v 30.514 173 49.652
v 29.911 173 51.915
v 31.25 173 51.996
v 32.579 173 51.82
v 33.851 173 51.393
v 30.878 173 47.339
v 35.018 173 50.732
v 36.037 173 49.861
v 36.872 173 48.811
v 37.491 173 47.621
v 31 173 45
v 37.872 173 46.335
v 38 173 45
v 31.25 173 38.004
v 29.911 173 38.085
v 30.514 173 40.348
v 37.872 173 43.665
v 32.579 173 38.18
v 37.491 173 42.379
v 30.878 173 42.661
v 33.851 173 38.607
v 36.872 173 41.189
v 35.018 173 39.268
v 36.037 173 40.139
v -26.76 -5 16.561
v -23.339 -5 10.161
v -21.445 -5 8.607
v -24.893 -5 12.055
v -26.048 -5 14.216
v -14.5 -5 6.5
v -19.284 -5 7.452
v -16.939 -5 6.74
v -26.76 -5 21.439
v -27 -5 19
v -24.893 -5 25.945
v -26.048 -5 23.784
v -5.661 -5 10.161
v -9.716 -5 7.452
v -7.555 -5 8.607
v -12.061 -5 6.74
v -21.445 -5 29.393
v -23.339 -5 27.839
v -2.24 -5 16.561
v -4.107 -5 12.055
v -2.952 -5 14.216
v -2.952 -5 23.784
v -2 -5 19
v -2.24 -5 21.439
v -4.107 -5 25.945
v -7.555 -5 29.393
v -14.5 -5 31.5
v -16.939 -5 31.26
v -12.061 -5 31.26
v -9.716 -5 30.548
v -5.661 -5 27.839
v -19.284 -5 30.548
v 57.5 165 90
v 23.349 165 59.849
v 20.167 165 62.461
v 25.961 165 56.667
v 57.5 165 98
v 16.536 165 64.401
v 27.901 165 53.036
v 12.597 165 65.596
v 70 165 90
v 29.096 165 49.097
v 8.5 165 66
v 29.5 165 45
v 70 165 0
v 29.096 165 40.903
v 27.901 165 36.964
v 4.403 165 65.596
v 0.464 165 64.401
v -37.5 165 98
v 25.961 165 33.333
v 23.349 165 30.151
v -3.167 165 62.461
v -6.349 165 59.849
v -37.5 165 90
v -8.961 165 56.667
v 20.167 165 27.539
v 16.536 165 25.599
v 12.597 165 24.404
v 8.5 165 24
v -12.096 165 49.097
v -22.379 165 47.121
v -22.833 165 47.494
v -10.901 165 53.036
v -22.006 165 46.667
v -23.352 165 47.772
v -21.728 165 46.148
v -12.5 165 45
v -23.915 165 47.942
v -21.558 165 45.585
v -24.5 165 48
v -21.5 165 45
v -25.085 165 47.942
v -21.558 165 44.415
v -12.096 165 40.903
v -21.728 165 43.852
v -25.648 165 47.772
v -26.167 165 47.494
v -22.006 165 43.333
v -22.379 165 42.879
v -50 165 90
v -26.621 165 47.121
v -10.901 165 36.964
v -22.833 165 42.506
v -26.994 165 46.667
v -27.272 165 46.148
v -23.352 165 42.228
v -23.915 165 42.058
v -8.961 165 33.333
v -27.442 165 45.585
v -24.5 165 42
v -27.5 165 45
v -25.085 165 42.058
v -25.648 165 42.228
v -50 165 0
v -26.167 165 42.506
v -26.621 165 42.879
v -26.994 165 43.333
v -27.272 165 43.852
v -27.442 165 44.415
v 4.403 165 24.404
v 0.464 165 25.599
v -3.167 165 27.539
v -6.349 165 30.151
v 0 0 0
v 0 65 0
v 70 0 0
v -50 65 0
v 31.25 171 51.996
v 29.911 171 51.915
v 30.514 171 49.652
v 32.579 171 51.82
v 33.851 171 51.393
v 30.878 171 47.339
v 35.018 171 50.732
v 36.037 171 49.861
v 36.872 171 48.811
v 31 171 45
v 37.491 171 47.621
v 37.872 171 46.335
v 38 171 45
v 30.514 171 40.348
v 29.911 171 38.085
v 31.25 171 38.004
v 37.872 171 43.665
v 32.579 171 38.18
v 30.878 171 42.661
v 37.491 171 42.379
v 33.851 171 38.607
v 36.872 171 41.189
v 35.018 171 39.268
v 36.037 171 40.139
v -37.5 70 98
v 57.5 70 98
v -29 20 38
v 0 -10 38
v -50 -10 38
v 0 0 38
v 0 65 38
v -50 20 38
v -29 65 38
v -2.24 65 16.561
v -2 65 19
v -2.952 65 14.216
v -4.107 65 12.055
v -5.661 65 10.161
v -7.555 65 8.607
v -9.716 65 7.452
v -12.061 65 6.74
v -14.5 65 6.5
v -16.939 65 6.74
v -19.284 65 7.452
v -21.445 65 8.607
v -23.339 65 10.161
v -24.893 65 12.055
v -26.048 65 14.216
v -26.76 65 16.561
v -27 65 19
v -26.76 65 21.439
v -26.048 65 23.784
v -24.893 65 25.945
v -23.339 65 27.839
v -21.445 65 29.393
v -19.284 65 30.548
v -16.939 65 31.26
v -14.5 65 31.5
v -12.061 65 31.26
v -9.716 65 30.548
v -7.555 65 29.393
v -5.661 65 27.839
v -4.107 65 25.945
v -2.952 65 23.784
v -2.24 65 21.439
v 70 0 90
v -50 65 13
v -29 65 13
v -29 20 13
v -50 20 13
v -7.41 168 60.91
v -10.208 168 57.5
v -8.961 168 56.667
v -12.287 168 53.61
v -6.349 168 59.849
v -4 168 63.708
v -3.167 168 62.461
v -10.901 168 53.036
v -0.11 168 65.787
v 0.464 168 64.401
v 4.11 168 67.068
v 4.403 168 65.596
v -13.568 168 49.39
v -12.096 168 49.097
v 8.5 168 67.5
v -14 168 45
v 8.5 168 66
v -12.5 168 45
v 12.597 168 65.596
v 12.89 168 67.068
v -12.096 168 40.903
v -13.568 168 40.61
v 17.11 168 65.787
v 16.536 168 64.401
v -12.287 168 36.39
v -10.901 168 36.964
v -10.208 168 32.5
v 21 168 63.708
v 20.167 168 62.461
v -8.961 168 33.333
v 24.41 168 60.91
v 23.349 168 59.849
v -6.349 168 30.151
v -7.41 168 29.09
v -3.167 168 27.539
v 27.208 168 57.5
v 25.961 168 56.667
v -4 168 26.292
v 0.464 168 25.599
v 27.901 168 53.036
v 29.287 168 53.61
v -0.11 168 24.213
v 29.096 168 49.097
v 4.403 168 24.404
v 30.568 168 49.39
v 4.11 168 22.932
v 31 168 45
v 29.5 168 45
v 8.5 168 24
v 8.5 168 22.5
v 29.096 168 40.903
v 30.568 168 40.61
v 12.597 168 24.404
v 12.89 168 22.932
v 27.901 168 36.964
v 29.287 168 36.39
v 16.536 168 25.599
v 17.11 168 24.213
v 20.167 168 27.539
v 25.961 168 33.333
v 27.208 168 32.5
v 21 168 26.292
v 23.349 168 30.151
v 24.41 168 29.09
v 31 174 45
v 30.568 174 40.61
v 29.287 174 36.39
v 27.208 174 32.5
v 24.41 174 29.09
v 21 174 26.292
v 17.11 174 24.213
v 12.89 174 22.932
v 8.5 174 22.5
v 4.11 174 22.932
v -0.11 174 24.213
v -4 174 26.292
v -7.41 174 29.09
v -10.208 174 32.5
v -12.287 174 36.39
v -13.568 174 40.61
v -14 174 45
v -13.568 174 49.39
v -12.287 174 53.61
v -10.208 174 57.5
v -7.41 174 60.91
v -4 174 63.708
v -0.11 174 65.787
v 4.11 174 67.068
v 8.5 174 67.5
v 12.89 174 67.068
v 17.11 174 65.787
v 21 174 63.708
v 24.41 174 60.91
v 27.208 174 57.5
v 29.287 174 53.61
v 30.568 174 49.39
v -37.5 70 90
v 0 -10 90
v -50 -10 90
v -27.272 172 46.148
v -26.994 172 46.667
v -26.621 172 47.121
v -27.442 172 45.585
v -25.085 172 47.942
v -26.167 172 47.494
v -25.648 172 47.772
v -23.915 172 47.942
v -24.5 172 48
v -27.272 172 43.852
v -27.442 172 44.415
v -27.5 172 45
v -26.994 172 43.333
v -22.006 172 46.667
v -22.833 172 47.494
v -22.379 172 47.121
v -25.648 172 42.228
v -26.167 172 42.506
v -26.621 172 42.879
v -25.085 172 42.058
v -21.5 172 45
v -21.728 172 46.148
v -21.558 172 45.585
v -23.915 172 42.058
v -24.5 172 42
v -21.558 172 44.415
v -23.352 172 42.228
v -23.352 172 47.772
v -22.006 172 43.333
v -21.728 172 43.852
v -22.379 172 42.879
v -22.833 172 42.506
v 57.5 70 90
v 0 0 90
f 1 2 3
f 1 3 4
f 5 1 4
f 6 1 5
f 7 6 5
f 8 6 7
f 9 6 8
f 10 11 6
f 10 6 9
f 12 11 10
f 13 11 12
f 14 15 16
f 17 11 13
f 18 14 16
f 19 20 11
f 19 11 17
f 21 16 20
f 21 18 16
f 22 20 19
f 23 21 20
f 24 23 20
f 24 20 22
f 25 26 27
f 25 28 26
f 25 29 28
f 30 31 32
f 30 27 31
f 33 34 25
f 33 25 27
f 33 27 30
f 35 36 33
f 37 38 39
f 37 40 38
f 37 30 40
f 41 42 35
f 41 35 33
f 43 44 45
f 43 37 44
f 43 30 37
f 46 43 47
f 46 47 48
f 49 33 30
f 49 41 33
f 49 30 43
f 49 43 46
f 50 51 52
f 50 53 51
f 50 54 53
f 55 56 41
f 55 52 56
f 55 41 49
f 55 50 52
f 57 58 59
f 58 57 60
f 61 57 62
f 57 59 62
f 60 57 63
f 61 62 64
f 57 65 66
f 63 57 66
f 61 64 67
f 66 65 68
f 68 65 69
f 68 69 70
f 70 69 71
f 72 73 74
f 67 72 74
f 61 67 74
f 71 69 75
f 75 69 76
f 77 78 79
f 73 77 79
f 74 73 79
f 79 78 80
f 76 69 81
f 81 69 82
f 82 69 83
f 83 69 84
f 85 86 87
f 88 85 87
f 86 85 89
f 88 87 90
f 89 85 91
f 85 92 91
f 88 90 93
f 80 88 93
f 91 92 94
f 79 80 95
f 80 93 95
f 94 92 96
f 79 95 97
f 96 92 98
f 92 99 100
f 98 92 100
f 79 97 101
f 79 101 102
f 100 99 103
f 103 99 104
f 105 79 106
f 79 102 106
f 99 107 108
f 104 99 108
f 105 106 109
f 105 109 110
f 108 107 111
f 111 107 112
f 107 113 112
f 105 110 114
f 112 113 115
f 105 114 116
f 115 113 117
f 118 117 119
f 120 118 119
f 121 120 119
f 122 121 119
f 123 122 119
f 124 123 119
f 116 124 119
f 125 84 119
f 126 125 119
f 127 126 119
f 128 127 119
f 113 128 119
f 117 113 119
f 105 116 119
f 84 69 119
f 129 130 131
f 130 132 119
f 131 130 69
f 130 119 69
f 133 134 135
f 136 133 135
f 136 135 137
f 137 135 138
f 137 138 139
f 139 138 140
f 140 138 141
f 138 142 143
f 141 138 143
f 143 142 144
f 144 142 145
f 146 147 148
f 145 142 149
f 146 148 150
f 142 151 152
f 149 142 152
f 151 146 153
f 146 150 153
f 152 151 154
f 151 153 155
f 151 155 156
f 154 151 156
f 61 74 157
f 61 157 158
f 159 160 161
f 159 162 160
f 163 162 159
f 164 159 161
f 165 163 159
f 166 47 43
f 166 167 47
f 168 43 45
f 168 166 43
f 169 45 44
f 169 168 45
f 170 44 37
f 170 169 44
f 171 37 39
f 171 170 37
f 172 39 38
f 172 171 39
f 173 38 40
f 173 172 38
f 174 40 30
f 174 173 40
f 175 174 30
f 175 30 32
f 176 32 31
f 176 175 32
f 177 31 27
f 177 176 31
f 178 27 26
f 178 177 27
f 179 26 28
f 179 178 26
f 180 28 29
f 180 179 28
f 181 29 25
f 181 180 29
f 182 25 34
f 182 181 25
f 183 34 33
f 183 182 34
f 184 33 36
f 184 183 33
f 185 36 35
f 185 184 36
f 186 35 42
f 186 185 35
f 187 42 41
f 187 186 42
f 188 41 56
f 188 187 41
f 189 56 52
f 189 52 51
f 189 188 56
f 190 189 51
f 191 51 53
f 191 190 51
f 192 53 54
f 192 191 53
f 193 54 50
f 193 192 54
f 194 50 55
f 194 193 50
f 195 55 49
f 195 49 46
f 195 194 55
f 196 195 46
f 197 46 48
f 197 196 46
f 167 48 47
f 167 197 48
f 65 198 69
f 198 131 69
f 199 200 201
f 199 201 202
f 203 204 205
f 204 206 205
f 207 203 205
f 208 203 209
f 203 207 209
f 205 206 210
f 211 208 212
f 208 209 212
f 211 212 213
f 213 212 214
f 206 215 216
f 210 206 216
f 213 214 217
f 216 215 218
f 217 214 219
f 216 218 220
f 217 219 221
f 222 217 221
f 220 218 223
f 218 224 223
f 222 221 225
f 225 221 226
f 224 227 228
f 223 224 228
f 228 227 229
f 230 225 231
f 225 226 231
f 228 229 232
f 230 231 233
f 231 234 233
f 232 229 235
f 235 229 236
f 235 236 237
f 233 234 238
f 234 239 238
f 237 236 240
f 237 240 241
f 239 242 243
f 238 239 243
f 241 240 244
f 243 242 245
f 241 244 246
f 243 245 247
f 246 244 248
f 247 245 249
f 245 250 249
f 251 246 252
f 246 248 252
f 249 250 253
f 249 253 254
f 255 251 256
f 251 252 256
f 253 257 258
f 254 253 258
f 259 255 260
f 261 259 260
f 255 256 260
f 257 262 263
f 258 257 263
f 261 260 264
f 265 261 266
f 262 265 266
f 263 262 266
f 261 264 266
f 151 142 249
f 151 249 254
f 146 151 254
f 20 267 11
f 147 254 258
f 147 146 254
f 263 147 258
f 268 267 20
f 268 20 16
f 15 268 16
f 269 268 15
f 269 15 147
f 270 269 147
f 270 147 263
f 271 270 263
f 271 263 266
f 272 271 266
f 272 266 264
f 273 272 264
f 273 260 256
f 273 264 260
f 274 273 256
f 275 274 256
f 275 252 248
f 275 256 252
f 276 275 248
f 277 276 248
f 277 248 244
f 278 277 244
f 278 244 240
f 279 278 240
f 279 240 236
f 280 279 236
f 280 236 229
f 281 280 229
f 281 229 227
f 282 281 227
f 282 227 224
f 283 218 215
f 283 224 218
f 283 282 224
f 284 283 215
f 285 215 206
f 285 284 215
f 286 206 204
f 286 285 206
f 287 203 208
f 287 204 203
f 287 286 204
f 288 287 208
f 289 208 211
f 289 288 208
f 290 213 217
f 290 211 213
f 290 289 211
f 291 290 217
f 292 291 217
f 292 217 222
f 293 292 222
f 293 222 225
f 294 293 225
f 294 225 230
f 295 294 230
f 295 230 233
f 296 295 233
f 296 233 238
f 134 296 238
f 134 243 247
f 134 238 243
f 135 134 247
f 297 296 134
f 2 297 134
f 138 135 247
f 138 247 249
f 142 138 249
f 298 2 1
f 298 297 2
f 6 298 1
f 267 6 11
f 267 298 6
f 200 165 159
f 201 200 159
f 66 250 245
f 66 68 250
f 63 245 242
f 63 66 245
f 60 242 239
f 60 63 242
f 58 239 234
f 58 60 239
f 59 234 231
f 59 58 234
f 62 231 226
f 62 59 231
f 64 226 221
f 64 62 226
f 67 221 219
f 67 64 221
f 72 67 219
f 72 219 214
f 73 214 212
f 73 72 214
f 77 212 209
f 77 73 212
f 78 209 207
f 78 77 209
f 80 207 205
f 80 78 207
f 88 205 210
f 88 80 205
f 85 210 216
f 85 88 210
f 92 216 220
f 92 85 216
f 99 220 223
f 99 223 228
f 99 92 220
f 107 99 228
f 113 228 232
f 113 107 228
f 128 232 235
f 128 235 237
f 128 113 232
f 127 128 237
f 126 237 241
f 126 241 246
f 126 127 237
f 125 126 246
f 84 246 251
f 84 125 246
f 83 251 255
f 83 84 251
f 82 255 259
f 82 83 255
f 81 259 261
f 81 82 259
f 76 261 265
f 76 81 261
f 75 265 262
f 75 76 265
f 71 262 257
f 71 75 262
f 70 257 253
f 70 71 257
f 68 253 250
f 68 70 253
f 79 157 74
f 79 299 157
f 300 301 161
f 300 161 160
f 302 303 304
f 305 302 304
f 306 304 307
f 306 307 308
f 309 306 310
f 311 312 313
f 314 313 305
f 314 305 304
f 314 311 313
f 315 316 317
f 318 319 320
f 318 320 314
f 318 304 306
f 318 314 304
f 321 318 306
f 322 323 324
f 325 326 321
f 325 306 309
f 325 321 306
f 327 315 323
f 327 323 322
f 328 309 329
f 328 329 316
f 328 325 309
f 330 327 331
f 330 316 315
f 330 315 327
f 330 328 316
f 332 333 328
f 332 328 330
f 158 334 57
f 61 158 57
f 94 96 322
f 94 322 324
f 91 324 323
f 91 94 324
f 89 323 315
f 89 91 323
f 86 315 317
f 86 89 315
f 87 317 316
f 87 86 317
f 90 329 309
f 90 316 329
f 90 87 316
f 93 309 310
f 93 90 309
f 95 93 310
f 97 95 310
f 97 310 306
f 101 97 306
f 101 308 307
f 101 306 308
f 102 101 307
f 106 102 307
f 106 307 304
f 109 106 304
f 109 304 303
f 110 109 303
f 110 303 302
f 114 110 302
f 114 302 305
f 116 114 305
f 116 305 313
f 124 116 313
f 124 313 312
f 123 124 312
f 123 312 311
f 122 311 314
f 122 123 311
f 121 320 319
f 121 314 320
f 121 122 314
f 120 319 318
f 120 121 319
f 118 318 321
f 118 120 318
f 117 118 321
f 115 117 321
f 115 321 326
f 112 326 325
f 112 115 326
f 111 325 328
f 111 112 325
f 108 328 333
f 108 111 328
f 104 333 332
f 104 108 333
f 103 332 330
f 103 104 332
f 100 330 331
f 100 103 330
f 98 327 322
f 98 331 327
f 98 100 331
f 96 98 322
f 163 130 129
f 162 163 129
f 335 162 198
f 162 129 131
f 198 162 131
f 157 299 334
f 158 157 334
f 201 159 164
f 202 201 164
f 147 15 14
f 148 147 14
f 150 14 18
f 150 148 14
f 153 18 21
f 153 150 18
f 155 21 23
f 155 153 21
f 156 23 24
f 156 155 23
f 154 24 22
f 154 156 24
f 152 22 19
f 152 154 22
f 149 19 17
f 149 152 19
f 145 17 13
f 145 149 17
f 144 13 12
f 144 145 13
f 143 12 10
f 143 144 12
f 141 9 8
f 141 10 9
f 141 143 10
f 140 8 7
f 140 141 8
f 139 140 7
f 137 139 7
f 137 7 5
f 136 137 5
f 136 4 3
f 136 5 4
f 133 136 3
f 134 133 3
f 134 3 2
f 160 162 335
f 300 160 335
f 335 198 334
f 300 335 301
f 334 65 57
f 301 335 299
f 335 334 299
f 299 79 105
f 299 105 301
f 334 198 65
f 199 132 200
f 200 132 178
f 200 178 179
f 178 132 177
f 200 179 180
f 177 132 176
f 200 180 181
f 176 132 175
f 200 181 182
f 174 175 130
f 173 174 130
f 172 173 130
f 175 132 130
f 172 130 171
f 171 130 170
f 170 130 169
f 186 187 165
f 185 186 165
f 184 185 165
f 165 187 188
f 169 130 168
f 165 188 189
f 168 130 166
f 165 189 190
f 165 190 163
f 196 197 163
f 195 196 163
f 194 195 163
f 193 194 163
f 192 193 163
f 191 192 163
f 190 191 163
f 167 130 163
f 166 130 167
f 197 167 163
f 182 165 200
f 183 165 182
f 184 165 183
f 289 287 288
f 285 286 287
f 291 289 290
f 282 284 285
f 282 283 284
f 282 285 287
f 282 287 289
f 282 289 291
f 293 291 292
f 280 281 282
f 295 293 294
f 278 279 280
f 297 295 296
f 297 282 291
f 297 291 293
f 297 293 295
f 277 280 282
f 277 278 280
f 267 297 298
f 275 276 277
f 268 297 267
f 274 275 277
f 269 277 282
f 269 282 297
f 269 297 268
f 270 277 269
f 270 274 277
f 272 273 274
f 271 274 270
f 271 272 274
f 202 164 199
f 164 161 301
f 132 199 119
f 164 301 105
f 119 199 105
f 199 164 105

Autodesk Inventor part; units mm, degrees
sketch "Sketch2" plane through (0, 0, 0) normal (0, 0, 1) x (1, 0, 0)
  line L0 (0, 0) -> (70, 0)
  line L1 (70, 0) -> (70, 165)
  line L2 (70, 165) -> (0, 165)
  line L3 (0, 165) -> (0, 0)
  dimension "d0" = 165
  dimension "d1" = 70
extrude "Extrusion1" add sketch "Sketch2" along normal blind 90
sketch "Sketch6" plane through (0, 0, 0) normal (-1, 0, 0) x (0, 0, 1)
  line L0 (90, 0) -> (90, 165) projected
  line L1 (0, 0) -> (0, 165) projected
  line L2 (90, 165) -> (0, 165)
  line L3 (0, 165) -> (0, 65)
  line L4 (0, 65) -> (90, 65)
  line L5 (90, 65) -> (90, 165)
  dimension "d8" = 100
extrude "Extrusion3" add sketch "Sketch6" along normal blind 50
sketch "Sketch7" plane through (0, 65, 0) normal (0, -1, 0) x (1, 0, 0)
  line L0 (70, 90) -> (-50, 90) projected
  line L1 (0, 0) -> (0, 90) projected
  line L2 (-50, 90) -> (0, 90)
  line L3 (0, 90) -> (0, 38)
  line L4 (0, 38) -> (-50, 38)
  line L5 (-50, 38) -> (-50, 90)
  dimension "d11" = 52
extrude "Extrusion4" add sketch "Sketch7" along normal blind 75
sketch "Sketch8" plane through (0, 65, 38) normal (0, 0, -1) x (-1, 0, 0)
  line L0 (0, 0) -> (50, 0) projected
  line L1 (50, 0) -> (29, 0)
  line L2 (29, 0) -> (29, -45)
  line L3 (29, -45) -> (50, -45)
  line L4 (50, -45) -> (50, 0)
  point P0 (0, -65)
  point P1 (29, 0)
  dimension "d14" = 21
  dimension "d15" = 45
extrude "Extrusion5" add sketch "Sketch8" along normal blind 25
sketch "Sketch9" plane through (0, 0, 90) normal (0, 0, 1) x (1, 0, 0)
  line L0 (70, 165) -> (-50, 165) projected
  line L1 (-50, 165) -> (70, 165)
  line L2 (70, 165) -> (10, 165)
  line L3 (10, 70) -> (57.5, 70)
  line L4 (57.5, 70) -> (-37.5, 70)
  line L5 (-37.5, 70) -> (-37.5, 165)
  line L6 (57.5, 70) -> (57.5, 165)
  point P0 (0, 0)
  dimension "d20" = 95
  dimension "d21" = 95
extrude "Extrusion6" add sketch "Sketch9" along normal blind 8
ref_plane "Work Plane1" through (-48, 65, 2) normal (0, -1, 0) x (1, 0, 0)
sketch "Sketch10" plane through (-48, 65, 2) normal (0, -1, 0) x (1, 0, 0)
  line L0 (21, 34) -> (46, 34) projected
  line L1 (33.5, 34) -> (33.5, 0)
  line L2 (46, 0) -> (0, 0) projected
  circle A0 centre (33.5, 17) radius 12.5
  point P0 (48, -2)
extrude "Extrusion7" add sketch "Sketch10" along normal blind 70
ref_plane "Work Plane3" through (-48, 165, 5) normal (0, 1, 0) x (1, 0, 0)
sketch "Sketch11" plane through (-48, 165, 5) normal (0, 1, 0) x (1, 0, 0)
  line L0 (113, 0) -> (113, -80) projected
  line L1 (0, -80) -> (0, 0) projected
  circle A0 centre (56.5, -40) radius 21
  point P0 (48, 5)
  dimension "d29" = 42
extrude "Extrusion8" add sketch "Sketch11" along normal blind 6
ref_plane "Work Plane2" through (-48, 165, 5) normal (0, 1, 0) x (1, 0, 0)
sketch "Sketch12" plane through (-48, 165, 5) normal (0, 1, 0) x (1, 0, 0)
  circle A0 centre (56.5, -40) radius 21 projected
  line L0 (35.5, -40) -> (26.5, -40)
  circle A1 centre (23.5, -40) radius 3
  point P0 (48, 5)
  dimension "d32" = 9
extrude "Extrusion9" add sketch "Sketch12" along normal blind 7 contours A1
sketch "Sketch13" plane through (8.5, 171, 45) normal (0, 1, 0) x (1, 0, 0)
  circle A0 centre (0, 0) radius 22.5
  arc A1 (21.4111, -6.9148) -> (21.4111, 6.9148) centre (22.5, 0) ccw
  point P0 (-8.5, 45)
  dimension "d37" = 45
  dimension "d38" = 14
extrude "Extrusion10" add sketch "Sketch13" along normal mid plane 6 contours A0
extrude "Extrusion11" add sketch "Sketch13" along normal blind 2 contours A0 A1
properties part number "windshield washer"
